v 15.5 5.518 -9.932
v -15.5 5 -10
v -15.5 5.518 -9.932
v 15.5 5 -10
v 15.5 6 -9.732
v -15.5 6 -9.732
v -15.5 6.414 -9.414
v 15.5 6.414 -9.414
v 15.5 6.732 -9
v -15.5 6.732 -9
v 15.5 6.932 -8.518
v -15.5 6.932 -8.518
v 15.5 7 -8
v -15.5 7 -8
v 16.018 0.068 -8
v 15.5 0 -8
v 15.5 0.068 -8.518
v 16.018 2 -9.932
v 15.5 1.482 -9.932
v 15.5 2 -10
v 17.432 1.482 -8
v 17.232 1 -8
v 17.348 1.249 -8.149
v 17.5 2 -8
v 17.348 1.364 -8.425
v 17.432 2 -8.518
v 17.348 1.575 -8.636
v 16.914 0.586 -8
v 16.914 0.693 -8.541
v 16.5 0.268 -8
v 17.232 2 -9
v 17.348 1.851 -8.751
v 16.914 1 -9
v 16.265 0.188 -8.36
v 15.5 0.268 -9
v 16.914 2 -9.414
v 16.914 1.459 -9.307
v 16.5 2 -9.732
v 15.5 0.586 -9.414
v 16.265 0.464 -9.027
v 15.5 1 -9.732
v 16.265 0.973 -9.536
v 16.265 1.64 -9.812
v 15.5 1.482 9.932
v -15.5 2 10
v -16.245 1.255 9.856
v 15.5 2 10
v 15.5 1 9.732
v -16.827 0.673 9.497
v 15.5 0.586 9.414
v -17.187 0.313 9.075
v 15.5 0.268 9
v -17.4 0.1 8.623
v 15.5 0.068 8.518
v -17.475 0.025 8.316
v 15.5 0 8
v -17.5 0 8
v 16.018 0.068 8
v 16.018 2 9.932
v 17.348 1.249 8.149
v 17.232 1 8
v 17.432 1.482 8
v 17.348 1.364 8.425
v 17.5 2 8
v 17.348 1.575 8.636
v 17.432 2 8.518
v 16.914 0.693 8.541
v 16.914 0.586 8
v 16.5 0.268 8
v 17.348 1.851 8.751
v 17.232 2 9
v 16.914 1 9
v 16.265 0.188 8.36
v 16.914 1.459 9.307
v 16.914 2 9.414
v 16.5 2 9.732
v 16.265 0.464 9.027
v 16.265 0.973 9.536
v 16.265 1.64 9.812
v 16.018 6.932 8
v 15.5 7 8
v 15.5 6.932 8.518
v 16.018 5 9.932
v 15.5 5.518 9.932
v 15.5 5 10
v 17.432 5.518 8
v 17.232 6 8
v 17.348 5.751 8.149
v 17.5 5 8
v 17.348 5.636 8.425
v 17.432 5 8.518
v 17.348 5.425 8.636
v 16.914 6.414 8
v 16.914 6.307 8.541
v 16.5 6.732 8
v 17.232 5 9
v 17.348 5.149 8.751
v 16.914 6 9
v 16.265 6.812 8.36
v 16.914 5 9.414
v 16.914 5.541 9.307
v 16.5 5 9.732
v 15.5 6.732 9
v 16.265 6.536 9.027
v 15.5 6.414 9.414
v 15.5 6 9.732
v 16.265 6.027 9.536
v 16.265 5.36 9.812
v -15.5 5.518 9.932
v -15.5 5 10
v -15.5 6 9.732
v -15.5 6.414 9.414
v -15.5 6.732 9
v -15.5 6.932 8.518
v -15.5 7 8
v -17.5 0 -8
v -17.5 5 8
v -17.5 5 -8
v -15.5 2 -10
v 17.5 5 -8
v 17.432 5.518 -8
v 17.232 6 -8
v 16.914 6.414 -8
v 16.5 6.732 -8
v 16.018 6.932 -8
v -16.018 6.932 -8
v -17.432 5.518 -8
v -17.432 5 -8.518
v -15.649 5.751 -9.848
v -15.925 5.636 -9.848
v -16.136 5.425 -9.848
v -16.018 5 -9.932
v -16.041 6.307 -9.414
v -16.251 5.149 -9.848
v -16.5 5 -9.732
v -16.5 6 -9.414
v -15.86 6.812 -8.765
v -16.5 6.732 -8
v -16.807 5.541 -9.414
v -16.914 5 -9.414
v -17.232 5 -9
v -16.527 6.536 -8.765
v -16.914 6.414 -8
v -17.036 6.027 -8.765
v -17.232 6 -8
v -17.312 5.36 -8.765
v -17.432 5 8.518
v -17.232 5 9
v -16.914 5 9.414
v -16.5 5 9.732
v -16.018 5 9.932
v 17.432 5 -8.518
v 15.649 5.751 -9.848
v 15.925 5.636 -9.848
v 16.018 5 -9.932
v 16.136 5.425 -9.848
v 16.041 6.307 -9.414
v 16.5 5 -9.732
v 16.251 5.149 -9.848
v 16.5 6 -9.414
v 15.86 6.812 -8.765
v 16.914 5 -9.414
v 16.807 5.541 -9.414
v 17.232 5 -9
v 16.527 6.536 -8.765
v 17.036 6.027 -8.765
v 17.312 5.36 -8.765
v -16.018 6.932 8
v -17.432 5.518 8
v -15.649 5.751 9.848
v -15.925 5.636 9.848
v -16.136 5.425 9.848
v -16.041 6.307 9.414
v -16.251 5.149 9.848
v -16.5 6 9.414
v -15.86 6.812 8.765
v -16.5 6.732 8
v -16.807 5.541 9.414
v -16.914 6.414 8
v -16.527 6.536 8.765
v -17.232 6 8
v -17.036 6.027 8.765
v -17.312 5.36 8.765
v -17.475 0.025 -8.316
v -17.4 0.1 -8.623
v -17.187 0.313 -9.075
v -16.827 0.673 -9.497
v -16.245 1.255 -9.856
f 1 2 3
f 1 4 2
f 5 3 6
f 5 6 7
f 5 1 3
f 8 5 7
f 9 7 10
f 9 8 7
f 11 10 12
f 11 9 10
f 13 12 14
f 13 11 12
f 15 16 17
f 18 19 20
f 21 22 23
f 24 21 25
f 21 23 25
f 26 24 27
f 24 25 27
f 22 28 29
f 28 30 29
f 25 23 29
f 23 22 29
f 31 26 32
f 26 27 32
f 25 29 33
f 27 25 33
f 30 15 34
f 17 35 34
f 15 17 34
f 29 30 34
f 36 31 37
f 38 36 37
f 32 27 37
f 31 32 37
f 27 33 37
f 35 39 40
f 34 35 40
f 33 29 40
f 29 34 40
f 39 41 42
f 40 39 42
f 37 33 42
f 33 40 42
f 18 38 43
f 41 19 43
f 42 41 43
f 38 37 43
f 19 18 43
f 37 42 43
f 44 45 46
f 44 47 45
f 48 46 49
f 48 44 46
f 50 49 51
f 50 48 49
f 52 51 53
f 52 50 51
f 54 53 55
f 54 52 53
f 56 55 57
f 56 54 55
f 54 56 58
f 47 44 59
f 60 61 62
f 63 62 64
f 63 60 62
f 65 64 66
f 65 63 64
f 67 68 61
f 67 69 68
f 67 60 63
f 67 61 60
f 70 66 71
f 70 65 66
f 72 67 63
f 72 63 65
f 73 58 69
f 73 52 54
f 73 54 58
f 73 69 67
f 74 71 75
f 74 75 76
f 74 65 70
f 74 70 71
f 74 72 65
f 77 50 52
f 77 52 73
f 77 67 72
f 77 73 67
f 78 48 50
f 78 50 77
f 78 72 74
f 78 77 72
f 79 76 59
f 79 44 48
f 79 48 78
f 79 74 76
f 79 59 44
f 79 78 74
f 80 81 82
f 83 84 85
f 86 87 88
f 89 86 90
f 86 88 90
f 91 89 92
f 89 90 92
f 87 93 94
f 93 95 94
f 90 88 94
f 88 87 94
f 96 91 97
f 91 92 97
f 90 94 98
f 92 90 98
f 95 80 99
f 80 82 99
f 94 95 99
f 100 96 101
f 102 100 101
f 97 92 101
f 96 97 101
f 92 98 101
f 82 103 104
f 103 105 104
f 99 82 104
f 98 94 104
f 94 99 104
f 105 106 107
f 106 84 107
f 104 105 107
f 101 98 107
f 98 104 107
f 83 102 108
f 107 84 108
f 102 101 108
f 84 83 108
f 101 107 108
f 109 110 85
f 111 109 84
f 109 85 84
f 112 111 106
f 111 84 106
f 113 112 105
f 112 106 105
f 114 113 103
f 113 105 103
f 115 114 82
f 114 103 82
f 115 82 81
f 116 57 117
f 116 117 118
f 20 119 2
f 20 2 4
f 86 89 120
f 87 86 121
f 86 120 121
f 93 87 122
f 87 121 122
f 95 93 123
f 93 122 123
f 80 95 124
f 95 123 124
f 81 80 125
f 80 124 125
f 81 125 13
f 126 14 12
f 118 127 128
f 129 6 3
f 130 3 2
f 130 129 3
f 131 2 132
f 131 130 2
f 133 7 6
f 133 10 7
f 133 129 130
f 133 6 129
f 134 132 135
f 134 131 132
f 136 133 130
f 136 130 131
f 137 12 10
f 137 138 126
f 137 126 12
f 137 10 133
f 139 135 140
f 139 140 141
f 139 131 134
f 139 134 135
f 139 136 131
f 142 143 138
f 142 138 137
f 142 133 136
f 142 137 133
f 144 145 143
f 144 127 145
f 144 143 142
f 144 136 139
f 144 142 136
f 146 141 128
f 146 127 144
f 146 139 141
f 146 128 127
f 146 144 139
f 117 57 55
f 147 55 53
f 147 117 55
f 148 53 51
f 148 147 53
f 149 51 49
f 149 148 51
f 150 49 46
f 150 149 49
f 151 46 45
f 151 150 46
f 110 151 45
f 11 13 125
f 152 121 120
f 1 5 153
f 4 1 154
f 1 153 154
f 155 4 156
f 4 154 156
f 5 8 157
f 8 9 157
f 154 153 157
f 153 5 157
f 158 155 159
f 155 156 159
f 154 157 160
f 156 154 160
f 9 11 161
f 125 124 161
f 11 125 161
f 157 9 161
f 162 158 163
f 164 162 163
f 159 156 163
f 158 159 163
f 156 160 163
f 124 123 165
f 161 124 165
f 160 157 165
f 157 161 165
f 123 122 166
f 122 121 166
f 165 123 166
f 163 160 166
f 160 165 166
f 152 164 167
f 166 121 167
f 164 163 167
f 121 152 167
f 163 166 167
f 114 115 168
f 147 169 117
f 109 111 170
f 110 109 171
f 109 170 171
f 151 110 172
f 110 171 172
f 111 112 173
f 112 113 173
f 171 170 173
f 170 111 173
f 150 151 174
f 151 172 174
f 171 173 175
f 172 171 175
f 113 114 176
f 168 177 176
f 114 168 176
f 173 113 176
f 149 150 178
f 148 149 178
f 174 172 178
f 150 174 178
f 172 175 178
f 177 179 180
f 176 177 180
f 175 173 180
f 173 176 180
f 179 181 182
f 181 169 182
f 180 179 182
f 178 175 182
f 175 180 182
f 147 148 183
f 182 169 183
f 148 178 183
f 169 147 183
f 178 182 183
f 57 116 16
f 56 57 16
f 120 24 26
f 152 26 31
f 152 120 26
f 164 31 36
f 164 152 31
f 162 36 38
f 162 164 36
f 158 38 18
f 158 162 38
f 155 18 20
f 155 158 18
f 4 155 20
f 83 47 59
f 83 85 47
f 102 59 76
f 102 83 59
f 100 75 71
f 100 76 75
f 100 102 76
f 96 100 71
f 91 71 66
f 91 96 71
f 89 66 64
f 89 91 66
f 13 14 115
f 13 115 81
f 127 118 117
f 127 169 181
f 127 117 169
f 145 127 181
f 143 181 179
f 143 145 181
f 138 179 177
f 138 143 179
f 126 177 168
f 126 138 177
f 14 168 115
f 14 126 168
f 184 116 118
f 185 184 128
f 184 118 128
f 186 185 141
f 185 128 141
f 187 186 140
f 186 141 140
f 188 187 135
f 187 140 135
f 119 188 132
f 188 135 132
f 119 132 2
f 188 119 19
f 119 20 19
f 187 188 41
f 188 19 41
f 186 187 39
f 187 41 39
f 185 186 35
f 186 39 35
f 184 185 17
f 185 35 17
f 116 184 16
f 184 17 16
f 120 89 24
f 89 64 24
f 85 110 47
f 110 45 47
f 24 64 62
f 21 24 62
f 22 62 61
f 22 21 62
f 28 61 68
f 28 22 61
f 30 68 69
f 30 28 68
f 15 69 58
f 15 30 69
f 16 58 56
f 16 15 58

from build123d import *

# Parameters (mm, degrees)
CROQUIS1_W              = 35
CROQUIS1_H              = 20
SALIENTE_EXTRUIR1_DEPTH = 7
REDONDEO1_R             = 2


with BuildPart() as part:
    # Croquis1 → Saliente-Extruir1 (new body)
    with BuildSketch(Plane(origin=(0, 0, 0), x_dir=(1, 0, 0), z_dir=(0, 1, 0))):
        Rectangle(CROQUIS1_W, CROQUIS1_H)
    extrude(amount=SALIENTE_EXTRUIR1_DEPTH)

    # Redondeo1
    redondeo1_edges = [part.edges().sort_by_distance(p)[0] for p in [
        (-17.5, 7, 0),
        (0, 7, 10),
        (17.5, 7, 0),
        (0, 0, 10),
        (0, 0, -10),
        (17.5, 0, 0),
        (0, 7, -10),
        (17.5, 3.5, 10),
        (-17.5, 3.5, 10),
        (-17.5, 3.5, -10),
        (17.5, 3.5, -10),
    ]]
    fillet(redondeo1_edges, radius=REDONDEO1_R)


solid = part.part
